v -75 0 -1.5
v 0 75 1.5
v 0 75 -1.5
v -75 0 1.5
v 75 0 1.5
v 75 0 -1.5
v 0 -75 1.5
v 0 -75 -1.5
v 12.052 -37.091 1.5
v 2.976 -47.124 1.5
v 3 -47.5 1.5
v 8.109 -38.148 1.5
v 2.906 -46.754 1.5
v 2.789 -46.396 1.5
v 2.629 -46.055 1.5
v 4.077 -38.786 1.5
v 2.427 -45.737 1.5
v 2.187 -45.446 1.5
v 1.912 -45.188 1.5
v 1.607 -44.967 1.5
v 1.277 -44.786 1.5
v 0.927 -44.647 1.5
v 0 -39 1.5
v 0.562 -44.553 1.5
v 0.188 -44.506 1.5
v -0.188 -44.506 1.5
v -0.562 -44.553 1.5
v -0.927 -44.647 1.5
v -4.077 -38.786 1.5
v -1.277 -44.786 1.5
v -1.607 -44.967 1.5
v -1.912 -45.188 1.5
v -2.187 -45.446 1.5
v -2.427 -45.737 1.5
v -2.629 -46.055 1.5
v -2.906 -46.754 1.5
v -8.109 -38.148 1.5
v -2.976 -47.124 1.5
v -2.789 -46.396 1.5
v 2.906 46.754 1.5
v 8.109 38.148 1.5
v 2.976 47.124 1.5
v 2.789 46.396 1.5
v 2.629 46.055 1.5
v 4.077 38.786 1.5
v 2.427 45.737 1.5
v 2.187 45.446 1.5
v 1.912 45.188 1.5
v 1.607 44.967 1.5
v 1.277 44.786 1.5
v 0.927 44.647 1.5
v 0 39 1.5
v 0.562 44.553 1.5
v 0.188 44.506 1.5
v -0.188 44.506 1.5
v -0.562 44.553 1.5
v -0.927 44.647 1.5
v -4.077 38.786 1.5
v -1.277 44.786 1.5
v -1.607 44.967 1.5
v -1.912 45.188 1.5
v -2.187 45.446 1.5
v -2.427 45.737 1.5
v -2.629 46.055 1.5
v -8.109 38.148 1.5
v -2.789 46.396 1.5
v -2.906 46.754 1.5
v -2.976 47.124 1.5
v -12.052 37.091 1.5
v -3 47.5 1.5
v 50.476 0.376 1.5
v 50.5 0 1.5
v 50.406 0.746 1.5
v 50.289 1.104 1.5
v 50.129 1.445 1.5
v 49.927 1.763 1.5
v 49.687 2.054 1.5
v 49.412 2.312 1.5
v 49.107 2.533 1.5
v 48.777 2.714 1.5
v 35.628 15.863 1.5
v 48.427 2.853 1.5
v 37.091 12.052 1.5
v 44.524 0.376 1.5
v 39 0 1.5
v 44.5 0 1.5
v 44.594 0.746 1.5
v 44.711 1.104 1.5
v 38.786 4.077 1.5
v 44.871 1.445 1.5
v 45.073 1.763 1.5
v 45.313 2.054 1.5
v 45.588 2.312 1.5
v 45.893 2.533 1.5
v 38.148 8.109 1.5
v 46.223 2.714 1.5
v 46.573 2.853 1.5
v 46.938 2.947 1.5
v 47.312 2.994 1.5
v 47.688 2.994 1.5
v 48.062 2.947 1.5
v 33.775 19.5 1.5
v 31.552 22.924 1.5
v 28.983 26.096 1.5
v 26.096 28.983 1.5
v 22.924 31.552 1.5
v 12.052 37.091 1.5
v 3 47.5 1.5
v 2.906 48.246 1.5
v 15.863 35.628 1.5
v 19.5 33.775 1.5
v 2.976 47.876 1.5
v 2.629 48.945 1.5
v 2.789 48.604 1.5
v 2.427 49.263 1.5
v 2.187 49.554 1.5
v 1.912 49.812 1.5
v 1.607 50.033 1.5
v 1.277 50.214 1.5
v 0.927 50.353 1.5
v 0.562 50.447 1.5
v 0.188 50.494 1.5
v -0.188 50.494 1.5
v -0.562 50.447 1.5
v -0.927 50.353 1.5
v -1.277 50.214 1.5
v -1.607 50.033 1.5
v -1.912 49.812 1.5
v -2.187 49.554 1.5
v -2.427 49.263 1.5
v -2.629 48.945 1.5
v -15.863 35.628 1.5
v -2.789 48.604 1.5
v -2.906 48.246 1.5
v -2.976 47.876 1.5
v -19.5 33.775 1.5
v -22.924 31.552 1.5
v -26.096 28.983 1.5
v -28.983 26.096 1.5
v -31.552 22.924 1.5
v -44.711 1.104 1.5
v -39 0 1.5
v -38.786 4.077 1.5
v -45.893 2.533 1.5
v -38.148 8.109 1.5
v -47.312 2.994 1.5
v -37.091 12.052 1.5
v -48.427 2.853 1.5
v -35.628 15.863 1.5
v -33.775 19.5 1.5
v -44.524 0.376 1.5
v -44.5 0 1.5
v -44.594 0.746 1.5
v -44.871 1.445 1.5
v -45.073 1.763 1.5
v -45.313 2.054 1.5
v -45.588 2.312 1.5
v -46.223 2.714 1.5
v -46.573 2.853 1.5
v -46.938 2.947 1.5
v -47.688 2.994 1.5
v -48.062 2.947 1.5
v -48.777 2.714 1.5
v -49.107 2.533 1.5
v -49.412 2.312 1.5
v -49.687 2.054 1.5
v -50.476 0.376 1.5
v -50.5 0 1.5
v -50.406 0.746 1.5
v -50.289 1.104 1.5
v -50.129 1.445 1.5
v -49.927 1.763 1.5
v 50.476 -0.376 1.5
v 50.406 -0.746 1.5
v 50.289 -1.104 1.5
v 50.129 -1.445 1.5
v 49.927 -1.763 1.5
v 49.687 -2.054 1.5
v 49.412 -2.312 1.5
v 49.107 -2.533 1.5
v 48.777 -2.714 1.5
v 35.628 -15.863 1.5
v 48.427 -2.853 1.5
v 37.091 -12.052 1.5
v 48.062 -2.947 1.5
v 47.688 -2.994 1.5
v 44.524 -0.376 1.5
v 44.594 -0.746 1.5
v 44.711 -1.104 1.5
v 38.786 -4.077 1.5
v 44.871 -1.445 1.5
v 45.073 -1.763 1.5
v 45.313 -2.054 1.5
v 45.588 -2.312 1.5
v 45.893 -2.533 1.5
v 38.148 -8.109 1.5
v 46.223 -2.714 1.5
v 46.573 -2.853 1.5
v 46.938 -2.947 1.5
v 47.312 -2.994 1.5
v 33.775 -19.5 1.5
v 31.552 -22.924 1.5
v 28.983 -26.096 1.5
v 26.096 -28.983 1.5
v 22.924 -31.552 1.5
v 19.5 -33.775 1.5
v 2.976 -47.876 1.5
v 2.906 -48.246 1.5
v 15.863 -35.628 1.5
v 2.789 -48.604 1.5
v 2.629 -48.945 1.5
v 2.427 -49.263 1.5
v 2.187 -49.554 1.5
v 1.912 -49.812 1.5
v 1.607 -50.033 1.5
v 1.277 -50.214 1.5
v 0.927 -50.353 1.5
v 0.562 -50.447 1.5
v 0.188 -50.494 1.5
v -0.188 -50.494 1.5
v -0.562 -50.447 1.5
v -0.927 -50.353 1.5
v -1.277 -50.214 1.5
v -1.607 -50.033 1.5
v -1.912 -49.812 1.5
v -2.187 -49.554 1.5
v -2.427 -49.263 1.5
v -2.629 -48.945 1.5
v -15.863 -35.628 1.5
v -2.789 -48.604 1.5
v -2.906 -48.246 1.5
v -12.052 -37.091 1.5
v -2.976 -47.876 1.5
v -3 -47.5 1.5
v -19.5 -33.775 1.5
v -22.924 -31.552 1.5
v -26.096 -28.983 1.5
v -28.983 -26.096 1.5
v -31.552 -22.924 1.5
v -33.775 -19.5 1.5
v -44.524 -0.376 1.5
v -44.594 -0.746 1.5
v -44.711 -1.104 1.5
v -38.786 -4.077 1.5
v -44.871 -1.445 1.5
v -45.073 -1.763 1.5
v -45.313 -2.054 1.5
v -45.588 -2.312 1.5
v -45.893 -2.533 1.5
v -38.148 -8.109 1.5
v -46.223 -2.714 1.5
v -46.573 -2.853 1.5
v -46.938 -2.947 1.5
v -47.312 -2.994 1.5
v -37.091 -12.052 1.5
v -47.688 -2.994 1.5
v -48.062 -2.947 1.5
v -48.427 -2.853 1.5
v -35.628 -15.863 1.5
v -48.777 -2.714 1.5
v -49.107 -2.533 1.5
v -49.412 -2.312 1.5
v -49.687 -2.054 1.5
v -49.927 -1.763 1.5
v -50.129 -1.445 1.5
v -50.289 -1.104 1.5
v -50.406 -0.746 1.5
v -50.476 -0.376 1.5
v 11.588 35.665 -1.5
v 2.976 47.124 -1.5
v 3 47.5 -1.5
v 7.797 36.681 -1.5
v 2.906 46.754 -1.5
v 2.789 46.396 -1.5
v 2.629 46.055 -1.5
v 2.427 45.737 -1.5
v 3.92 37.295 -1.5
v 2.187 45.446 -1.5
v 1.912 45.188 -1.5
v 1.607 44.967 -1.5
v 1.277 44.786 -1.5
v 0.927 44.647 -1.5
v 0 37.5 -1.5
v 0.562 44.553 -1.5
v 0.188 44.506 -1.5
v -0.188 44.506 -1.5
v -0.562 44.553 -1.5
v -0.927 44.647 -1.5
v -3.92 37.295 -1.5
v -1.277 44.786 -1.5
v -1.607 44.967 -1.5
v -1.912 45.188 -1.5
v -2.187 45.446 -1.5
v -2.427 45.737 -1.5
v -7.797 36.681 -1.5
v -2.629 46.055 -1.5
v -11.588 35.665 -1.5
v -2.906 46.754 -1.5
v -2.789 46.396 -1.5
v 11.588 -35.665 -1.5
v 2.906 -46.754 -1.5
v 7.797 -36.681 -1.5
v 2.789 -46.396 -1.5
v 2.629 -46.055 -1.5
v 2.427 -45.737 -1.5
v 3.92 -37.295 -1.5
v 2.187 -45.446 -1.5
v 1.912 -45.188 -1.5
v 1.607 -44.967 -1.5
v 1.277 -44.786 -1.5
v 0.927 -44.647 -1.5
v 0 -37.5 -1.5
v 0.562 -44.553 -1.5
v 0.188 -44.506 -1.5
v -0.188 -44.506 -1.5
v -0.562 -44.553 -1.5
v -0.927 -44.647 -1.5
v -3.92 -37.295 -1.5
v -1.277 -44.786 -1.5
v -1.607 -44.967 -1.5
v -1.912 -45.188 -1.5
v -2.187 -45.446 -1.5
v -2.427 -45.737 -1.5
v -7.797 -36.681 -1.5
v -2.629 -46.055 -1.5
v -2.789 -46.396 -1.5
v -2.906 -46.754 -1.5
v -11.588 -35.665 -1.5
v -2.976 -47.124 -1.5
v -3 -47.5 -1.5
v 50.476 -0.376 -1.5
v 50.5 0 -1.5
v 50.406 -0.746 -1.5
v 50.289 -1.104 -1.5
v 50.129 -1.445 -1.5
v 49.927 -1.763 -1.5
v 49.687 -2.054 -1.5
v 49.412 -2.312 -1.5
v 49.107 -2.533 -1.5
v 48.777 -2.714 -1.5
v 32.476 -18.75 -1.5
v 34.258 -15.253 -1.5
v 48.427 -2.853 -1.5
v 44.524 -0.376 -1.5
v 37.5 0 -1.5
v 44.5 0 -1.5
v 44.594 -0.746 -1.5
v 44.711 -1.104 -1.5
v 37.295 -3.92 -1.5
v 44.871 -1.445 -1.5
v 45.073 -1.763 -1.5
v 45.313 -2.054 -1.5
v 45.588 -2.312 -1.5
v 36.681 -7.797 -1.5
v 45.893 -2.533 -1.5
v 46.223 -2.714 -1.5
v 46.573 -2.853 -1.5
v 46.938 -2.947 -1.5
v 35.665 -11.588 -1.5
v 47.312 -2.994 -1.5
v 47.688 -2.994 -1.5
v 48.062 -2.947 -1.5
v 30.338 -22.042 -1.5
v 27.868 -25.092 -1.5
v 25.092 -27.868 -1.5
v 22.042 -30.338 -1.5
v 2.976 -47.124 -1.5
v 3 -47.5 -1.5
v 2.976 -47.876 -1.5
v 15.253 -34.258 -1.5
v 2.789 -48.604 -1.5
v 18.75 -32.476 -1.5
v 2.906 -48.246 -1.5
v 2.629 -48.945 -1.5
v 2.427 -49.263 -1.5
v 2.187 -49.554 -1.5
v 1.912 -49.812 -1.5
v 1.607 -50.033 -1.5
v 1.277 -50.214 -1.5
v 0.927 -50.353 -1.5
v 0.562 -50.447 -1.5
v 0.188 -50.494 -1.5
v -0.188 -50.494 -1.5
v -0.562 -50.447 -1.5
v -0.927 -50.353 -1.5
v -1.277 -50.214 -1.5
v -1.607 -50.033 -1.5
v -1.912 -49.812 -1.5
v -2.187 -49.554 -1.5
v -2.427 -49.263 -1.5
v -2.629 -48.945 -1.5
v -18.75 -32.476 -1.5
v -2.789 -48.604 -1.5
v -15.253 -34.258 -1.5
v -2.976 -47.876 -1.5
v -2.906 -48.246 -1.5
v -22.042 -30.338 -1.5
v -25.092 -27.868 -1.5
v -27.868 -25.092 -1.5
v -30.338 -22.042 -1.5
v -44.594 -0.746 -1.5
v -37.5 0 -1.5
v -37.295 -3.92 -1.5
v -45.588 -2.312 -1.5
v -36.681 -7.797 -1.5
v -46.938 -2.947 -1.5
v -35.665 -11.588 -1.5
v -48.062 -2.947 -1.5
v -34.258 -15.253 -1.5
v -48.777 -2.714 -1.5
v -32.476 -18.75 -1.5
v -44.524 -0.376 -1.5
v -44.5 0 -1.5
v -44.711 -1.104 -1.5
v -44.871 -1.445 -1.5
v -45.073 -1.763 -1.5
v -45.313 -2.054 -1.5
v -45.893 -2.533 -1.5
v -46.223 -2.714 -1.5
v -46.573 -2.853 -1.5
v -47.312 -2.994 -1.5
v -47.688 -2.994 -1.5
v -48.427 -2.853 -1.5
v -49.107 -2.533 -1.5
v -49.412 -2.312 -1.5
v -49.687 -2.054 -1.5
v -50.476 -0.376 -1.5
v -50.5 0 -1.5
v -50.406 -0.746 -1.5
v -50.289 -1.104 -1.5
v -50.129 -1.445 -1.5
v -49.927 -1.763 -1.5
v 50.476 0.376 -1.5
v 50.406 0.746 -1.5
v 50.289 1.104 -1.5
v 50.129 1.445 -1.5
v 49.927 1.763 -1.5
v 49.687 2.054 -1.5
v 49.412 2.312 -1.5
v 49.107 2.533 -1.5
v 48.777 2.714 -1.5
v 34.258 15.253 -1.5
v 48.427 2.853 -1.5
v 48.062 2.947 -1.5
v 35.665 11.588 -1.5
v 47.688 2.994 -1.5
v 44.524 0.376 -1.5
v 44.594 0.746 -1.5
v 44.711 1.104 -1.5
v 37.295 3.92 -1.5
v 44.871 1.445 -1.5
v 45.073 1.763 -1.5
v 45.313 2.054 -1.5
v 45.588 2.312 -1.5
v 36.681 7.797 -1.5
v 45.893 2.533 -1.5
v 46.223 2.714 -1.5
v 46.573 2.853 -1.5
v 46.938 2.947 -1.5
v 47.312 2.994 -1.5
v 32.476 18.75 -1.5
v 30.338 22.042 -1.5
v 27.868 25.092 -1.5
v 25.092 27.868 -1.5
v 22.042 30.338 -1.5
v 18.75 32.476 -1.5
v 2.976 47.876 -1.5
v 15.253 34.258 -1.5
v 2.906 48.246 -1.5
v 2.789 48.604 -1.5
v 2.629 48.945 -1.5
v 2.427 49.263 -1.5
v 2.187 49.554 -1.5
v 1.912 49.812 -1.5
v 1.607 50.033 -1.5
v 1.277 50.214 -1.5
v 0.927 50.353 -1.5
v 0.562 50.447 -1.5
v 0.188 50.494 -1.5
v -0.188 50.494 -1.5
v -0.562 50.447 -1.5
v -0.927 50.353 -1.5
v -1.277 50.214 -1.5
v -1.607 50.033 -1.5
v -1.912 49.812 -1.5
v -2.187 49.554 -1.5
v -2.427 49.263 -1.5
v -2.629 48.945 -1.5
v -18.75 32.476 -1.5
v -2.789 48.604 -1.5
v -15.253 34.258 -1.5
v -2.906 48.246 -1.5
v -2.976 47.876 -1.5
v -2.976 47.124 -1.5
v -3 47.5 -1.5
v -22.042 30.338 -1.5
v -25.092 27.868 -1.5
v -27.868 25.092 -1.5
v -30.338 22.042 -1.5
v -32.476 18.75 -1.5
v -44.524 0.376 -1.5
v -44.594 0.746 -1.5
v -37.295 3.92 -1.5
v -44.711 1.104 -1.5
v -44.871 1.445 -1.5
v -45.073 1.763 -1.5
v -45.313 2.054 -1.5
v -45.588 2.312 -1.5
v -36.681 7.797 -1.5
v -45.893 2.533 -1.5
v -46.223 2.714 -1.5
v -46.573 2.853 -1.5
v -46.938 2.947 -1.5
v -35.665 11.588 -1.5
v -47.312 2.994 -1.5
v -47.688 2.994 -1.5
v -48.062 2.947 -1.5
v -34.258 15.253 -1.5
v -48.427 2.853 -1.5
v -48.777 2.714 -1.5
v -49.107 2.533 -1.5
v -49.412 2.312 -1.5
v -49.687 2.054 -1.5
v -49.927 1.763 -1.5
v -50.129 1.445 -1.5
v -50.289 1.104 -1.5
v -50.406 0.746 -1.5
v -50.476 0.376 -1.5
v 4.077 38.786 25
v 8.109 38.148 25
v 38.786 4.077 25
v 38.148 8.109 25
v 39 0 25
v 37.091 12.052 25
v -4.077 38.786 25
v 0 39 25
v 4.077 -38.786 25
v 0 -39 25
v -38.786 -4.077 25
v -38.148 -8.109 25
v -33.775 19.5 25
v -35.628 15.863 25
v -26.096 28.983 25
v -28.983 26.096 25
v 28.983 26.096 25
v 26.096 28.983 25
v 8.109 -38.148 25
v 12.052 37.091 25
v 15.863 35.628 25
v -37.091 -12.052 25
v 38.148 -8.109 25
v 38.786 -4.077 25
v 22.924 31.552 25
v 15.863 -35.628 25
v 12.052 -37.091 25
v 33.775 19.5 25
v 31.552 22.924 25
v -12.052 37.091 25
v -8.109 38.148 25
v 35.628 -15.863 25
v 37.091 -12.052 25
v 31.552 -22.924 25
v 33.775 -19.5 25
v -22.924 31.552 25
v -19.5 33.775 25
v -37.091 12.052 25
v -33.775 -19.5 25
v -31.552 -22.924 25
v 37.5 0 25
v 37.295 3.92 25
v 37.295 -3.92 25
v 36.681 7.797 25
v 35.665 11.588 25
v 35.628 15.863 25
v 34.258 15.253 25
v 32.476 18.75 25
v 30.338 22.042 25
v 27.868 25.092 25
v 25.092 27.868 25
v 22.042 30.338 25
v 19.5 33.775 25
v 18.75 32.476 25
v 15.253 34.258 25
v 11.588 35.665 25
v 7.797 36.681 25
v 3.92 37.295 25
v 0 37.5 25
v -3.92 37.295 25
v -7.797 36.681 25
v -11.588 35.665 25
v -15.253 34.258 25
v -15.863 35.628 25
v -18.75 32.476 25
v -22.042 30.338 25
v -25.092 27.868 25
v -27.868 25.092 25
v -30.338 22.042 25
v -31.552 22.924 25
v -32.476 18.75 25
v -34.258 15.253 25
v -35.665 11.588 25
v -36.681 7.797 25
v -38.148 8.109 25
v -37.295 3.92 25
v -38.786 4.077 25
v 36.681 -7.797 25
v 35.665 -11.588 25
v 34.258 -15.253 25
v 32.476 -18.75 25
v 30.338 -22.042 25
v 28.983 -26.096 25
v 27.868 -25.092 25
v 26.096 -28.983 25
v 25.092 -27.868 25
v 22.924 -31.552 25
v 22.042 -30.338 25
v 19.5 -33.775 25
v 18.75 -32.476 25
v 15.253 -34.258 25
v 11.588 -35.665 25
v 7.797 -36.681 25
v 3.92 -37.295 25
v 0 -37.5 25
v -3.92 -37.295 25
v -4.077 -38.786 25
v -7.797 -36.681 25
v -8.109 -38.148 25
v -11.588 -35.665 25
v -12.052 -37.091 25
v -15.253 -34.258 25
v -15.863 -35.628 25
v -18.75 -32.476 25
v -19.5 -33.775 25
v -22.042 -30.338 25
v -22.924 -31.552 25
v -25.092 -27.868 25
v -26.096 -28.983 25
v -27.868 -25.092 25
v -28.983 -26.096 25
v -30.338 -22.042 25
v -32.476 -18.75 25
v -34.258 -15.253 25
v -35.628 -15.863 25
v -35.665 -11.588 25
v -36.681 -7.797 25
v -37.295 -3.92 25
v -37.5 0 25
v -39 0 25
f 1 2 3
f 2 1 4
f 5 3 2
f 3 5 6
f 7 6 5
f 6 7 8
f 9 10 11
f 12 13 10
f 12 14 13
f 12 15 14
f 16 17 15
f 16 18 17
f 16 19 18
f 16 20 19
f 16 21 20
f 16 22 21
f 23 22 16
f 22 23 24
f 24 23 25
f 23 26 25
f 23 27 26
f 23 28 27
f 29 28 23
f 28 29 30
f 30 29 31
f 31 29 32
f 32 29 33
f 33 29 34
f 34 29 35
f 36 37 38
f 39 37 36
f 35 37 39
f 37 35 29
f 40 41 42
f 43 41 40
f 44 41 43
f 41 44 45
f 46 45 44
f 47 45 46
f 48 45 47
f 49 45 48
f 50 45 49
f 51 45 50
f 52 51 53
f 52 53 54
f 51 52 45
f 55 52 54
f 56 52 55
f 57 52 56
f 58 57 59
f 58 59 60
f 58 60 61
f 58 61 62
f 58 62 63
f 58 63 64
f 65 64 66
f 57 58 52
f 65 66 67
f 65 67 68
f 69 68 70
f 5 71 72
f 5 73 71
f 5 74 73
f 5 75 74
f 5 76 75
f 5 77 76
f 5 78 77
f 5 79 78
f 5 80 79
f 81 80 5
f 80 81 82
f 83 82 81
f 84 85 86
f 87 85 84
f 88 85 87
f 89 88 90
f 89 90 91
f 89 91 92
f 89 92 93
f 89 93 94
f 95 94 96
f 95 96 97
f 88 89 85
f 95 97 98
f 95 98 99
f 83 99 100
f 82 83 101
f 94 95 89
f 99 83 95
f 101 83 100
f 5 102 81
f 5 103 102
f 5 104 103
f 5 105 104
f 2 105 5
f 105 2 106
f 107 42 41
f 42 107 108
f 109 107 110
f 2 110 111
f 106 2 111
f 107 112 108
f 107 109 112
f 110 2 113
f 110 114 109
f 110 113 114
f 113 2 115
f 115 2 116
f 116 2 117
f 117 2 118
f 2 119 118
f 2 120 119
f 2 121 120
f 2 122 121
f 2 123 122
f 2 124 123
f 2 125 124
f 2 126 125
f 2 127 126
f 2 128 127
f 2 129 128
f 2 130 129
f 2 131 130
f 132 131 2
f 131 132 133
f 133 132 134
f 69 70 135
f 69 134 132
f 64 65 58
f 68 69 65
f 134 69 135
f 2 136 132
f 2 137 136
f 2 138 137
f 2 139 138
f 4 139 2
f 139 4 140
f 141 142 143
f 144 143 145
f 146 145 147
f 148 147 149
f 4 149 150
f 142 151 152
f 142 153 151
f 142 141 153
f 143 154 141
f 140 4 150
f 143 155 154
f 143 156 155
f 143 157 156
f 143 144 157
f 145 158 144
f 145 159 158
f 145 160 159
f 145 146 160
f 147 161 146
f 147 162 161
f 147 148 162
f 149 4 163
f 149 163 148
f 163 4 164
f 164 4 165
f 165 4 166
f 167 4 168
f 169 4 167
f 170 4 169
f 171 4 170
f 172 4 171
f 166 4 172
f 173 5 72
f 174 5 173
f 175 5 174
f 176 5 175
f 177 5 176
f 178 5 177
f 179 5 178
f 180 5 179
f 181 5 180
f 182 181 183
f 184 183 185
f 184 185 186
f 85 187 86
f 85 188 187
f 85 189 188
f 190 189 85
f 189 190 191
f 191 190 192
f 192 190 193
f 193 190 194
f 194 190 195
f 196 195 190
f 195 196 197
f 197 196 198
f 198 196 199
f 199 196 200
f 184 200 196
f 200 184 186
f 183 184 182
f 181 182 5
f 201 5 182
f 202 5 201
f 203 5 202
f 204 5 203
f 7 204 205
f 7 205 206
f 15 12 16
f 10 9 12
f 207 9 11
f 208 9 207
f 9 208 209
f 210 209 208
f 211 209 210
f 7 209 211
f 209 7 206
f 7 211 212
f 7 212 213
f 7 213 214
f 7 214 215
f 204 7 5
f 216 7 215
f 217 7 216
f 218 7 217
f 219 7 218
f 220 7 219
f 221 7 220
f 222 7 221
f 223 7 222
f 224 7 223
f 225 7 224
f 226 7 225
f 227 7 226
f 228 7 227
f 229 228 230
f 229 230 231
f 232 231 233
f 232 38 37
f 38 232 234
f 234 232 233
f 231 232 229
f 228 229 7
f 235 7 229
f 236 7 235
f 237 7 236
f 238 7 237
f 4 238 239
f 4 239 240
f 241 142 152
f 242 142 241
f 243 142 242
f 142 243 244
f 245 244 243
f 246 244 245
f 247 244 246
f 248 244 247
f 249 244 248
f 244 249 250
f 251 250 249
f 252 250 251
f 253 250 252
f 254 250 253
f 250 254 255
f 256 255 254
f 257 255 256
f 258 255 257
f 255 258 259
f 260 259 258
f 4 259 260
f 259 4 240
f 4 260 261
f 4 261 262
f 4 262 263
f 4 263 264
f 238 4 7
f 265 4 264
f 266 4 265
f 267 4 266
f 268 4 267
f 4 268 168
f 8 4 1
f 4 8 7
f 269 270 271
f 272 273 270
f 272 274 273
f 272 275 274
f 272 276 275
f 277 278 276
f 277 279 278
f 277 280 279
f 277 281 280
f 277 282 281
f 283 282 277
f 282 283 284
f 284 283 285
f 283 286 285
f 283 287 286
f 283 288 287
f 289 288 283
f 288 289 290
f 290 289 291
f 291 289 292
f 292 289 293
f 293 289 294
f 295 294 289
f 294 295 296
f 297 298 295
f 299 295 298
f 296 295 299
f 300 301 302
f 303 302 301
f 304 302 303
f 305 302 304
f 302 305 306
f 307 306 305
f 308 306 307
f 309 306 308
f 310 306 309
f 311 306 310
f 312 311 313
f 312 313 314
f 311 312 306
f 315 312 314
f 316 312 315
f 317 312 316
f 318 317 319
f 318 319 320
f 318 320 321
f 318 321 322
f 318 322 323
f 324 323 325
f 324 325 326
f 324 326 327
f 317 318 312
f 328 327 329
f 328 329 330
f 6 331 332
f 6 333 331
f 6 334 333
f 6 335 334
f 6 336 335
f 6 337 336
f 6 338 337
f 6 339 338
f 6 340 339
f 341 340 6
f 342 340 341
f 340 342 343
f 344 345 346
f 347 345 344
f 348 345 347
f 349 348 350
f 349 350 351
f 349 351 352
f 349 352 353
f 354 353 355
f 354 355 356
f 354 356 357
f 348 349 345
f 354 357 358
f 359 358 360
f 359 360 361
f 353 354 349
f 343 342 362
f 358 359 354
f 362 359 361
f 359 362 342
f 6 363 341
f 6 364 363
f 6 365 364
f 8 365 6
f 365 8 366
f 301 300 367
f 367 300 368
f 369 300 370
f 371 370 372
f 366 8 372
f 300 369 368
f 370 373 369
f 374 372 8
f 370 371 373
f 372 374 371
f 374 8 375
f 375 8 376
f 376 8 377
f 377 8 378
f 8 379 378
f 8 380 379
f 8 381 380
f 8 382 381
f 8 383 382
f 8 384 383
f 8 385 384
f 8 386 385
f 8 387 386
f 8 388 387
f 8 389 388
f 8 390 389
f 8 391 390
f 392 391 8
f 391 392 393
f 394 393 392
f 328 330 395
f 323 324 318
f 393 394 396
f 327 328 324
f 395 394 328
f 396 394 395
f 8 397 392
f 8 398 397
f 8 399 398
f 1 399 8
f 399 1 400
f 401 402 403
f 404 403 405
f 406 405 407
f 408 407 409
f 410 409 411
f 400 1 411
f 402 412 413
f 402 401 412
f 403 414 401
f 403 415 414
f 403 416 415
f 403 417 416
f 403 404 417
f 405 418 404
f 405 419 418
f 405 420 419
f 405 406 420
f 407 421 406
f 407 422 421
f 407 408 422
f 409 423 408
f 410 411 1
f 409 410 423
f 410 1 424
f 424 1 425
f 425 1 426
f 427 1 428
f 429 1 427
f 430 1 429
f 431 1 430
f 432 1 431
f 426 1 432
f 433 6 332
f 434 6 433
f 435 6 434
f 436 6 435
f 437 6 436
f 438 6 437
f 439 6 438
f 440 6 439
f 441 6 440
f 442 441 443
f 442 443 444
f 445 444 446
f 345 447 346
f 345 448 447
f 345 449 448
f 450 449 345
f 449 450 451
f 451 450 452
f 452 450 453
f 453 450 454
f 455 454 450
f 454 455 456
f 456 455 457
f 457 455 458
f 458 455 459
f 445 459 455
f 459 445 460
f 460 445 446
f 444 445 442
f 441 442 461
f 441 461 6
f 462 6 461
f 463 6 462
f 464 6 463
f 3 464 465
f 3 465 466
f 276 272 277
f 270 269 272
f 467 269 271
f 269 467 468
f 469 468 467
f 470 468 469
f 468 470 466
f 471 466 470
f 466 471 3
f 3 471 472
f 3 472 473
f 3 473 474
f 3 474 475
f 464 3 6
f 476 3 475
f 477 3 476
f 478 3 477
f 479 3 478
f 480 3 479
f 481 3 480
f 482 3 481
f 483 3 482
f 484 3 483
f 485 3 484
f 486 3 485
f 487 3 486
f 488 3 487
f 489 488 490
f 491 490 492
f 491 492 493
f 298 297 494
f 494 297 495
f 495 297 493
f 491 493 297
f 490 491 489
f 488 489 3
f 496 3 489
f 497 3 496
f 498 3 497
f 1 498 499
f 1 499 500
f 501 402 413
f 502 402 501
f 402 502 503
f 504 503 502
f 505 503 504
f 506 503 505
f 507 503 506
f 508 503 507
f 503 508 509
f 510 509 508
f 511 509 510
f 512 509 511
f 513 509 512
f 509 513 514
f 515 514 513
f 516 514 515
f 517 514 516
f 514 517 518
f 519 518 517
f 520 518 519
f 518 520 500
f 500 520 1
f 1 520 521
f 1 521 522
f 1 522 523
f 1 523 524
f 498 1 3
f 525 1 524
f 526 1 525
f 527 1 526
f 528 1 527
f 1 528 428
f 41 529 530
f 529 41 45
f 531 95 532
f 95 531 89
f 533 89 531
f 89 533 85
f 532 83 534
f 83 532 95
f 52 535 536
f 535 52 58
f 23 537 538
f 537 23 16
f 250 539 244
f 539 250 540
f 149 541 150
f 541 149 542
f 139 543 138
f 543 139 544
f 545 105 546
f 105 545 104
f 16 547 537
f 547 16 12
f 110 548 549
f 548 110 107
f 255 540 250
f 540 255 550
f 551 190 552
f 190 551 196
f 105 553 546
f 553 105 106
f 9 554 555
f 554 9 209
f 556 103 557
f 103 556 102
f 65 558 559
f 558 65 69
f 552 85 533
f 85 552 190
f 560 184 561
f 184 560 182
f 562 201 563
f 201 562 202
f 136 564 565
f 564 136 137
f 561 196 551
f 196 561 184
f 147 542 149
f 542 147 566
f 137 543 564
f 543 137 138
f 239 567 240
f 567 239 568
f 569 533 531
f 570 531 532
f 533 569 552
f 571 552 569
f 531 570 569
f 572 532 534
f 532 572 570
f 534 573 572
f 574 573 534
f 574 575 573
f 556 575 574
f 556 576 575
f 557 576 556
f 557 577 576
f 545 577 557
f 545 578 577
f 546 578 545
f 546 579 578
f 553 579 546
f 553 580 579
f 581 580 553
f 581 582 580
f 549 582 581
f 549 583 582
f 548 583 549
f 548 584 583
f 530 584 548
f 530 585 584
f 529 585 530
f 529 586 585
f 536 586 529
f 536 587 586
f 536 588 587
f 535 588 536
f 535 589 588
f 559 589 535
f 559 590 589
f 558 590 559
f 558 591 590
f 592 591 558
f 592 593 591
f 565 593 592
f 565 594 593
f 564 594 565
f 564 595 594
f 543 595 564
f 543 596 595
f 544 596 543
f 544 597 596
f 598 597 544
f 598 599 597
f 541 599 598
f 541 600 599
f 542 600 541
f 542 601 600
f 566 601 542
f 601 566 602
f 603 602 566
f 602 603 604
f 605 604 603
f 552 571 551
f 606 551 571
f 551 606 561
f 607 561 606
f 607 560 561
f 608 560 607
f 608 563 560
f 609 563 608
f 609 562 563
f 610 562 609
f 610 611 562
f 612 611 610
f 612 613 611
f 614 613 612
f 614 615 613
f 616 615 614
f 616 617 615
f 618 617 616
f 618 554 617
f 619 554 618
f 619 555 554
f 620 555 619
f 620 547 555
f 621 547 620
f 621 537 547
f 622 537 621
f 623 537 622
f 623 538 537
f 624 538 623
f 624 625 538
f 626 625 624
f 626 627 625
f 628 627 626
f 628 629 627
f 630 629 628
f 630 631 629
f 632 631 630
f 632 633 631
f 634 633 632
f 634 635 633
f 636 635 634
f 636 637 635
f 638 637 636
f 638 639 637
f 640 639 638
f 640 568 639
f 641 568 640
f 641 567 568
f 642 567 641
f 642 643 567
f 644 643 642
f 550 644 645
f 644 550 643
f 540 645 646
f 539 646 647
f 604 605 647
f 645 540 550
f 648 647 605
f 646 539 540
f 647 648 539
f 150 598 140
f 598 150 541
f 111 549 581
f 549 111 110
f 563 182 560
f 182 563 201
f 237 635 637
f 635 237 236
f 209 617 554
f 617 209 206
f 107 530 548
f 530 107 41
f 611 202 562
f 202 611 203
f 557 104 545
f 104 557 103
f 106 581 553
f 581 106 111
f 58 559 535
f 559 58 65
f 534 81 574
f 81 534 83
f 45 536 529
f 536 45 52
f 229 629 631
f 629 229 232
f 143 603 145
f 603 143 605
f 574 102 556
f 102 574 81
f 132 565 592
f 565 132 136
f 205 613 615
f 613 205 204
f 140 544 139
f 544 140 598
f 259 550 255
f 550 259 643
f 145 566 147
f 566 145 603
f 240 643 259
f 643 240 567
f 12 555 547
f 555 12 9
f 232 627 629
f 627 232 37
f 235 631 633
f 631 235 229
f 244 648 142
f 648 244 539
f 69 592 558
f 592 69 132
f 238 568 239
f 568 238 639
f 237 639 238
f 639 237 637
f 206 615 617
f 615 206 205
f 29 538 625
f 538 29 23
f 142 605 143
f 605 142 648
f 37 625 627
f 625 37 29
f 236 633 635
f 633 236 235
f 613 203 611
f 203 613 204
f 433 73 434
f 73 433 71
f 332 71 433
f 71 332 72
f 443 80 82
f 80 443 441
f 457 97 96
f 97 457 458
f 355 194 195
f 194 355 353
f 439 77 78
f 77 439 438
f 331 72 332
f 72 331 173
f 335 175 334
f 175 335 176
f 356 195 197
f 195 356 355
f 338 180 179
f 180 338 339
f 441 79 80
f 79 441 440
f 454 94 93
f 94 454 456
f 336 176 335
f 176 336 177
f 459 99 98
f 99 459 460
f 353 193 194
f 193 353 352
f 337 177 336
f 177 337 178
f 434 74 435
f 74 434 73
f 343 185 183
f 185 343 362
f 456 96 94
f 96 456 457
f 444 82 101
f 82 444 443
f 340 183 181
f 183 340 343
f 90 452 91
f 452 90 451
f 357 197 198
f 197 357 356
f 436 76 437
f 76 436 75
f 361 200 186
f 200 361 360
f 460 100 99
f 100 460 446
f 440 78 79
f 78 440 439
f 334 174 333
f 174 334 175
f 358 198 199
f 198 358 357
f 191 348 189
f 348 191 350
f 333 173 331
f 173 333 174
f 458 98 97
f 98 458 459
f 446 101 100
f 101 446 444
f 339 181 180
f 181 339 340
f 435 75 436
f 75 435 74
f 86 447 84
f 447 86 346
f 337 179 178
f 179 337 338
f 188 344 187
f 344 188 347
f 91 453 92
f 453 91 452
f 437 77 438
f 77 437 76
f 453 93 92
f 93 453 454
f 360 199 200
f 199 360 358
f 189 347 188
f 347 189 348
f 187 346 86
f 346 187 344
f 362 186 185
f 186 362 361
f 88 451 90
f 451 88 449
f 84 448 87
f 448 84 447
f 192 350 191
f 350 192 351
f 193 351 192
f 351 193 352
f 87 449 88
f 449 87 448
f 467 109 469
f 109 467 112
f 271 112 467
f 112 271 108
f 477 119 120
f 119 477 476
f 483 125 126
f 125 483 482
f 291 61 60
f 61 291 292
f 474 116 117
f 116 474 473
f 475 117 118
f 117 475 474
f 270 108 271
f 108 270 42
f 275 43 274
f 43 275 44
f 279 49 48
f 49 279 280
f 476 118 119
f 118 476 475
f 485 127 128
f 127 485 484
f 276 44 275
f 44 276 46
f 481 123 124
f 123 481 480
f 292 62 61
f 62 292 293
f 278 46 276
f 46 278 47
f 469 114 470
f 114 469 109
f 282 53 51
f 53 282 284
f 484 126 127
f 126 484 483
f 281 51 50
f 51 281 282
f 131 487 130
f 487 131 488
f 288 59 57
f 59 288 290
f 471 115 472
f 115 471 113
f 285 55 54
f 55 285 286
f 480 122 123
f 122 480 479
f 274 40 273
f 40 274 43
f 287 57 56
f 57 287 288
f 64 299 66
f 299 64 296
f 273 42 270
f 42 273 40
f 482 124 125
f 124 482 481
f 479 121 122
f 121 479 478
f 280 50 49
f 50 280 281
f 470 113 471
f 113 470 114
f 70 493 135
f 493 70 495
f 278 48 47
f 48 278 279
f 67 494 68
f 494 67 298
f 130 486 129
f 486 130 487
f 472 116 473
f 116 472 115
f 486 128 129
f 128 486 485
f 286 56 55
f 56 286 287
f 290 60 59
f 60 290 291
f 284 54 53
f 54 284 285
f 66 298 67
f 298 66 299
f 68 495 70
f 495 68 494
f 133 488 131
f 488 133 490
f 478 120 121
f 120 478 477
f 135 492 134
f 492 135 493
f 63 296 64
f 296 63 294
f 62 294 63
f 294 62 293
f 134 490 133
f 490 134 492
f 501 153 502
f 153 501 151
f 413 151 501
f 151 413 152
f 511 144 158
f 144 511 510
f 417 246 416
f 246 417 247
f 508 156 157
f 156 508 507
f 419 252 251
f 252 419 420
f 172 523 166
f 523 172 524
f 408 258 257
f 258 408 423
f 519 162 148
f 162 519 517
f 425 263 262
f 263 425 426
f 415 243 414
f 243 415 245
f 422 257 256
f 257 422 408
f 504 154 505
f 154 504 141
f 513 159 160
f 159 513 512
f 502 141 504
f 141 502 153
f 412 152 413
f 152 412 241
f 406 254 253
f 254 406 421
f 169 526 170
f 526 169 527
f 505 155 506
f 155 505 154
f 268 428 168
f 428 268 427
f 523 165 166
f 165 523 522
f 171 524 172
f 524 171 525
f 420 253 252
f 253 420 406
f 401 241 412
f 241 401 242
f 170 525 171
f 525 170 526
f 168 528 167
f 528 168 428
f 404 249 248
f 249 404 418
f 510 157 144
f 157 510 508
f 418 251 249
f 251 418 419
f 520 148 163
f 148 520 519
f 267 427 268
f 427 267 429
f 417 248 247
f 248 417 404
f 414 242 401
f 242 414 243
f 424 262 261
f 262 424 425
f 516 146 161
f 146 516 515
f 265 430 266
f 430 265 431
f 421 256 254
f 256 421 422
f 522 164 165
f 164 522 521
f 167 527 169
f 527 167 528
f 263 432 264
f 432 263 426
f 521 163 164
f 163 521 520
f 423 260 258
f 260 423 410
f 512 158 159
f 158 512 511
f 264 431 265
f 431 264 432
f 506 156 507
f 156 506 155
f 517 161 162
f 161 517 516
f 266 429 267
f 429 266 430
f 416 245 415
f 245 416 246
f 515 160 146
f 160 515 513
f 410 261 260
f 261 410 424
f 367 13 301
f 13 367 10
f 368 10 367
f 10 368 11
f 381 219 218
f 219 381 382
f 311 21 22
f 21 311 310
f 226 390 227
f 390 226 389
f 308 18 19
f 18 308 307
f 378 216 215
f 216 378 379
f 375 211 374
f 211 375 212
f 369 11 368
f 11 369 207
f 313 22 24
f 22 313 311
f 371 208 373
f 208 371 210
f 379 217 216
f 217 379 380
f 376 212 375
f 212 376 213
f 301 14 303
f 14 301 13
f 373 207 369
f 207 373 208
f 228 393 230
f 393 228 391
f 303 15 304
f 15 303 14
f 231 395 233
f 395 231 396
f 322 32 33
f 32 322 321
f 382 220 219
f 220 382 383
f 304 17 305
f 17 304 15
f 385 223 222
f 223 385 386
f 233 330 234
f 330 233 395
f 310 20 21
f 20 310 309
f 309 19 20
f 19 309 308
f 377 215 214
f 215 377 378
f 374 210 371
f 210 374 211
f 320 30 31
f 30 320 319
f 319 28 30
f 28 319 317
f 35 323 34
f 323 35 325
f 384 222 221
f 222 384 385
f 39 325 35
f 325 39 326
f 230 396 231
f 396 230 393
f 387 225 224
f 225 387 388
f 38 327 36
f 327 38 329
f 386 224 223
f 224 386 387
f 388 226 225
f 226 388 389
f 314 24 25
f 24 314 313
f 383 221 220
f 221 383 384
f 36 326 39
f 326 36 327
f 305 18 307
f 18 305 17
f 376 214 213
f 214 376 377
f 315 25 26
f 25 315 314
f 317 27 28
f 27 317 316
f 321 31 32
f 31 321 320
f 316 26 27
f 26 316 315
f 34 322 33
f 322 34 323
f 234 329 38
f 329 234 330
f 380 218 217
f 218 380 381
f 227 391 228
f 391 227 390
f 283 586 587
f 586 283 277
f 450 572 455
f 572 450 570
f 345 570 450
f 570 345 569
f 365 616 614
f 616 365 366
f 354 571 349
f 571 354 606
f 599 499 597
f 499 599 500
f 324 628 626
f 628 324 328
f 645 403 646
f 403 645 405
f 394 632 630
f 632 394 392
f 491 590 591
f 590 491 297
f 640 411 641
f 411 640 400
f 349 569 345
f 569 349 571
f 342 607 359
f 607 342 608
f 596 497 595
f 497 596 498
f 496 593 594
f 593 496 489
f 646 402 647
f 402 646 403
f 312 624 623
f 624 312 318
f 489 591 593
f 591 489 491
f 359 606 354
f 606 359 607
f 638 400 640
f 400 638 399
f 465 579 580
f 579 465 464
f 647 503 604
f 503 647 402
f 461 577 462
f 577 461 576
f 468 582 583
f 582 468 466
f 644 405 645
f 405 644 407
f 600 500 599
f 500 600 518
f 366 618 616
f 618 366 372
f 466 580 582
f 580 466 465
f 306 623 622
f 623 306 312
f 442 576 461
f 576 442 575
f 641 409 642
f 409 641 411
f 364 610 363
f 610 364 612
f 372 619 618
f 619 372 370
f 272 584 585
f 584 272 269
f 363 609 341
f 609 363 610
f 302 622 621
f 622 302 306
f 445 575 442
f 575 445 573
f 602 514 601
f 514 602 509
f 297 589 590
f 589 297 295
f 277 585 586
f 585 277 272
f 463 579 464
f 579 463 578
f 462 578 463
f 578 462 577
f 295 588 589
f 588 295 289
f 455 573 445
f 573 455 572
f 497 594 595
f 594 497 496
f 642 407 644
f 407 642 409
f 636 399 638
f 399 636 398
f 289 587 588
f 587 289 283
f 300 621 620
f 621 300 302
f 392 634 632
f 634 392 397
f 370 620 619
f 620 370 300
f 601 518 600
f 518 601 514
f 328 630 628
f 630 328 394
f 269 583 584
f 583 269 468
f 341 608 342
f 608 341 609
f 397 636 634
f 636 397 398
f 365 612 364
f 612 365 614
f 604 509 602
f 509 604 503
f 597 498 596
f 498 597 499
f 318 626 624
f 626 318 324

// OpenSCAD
/* 
*  Open SCAD Name.: flange_model_v3.scad
*  Copyright (c)..: 2017 www.DIY3DTech.com
*
*  Creation Date..:12/24/2017
*  Discription....: general flange model
*
*  Rev 1: Developed Model
*  Rev 2: Multi-shaped flange
*
*  This program is free software; you can redistribute it and/or modify
*  it under the terms of the GNU General Public License as published by
*  the Free Software Foundation; either version 2 of the License, or
*  (at your option) any later version.
*
*  This program is distributed in the hope that it will be useful,
*  but WITHOUT ANY WARRANTY; without even the implied warranty of
*  MERCHANTABILITY or FITNESS FOR A PARTICULAR PURPOSE.  See the
*  GNU General Public License for more details.
*
*  If used commercially attribution is required (OpenSCAD.DIY3DTech.com)
*
*/ 

/*------------------Customizer View-------------------*/
// preview[view:north, tilt:top]


/*---------------------Parameters---------------------*/

// outer flange shape
flange_shape_outside    =    4;      //[4:1:60]
// outer flange shape
flange_shape_inside     =   60;      //[4:1:60]
// outer diameter in (mm)
flange_OD               =  150;      //[50:1:300]
// inter diameter in (mm)
flange_ID               =   75;      //[25:1:200]
// flange height in (mm)
flange_height           =    3;      //[3:1:10]
// tube center height
center_height           =   25;      //[3:1:50]
// opening diameter in (mm)
bolt_ID                 =    6;      //[3:1:12]
// center to center spread of retaining bolts (mm)
bolt_spread             =   95;      //[25:1:250]
// number of bolts in flange
bolt_count              =    4;      //[2:1:24]

/*-----------------------Execute----------------------*/

flange();

/*-----------------------Modules----------------------*/

module flange() {
    difference(){
        //create flange
         union() {
            cylinder(flange_height,flange_OD/2,flange_OD/2,$fn=flange_shape_outside,true);
            translate([0, 0,center_height/2]) cylinder(center_height,(flange_ID+flange_height)/2,(flange_ID+flange_height)/2,$fn=flange_shape_inside,true);
         }
        //remove center
        translate([0, 0,center_height/2]) cylinder(center_height*2,flange_ID/2,flange_ID/2,$fn=flange_shape_inside,true);
        
        
        //create circle pattern    
        for (i=[0:(360/bolt_count):360]) {
            //theta is degrees set by for loop from 0 to 360 (degrees)
            theta=i;
            //this sets the x axis point based on the COS of the theta
            x=0+(bolt_spread/2)*cos(theta);
            //this sets the y axis point based on the sin of the theta
            y=0+(bolt_spread/2)*sin(theta);
            //this creates the circle or other obect at the x,y point
            translate([x,y,0]) cylinder(flange_height+2,bolt_ID/2,bolt_ID/2,$fn=50,true);;
        }//end for loop for circle creation
    
    }//end differance
}//end module

/*---------------------End Program--------------------*/
